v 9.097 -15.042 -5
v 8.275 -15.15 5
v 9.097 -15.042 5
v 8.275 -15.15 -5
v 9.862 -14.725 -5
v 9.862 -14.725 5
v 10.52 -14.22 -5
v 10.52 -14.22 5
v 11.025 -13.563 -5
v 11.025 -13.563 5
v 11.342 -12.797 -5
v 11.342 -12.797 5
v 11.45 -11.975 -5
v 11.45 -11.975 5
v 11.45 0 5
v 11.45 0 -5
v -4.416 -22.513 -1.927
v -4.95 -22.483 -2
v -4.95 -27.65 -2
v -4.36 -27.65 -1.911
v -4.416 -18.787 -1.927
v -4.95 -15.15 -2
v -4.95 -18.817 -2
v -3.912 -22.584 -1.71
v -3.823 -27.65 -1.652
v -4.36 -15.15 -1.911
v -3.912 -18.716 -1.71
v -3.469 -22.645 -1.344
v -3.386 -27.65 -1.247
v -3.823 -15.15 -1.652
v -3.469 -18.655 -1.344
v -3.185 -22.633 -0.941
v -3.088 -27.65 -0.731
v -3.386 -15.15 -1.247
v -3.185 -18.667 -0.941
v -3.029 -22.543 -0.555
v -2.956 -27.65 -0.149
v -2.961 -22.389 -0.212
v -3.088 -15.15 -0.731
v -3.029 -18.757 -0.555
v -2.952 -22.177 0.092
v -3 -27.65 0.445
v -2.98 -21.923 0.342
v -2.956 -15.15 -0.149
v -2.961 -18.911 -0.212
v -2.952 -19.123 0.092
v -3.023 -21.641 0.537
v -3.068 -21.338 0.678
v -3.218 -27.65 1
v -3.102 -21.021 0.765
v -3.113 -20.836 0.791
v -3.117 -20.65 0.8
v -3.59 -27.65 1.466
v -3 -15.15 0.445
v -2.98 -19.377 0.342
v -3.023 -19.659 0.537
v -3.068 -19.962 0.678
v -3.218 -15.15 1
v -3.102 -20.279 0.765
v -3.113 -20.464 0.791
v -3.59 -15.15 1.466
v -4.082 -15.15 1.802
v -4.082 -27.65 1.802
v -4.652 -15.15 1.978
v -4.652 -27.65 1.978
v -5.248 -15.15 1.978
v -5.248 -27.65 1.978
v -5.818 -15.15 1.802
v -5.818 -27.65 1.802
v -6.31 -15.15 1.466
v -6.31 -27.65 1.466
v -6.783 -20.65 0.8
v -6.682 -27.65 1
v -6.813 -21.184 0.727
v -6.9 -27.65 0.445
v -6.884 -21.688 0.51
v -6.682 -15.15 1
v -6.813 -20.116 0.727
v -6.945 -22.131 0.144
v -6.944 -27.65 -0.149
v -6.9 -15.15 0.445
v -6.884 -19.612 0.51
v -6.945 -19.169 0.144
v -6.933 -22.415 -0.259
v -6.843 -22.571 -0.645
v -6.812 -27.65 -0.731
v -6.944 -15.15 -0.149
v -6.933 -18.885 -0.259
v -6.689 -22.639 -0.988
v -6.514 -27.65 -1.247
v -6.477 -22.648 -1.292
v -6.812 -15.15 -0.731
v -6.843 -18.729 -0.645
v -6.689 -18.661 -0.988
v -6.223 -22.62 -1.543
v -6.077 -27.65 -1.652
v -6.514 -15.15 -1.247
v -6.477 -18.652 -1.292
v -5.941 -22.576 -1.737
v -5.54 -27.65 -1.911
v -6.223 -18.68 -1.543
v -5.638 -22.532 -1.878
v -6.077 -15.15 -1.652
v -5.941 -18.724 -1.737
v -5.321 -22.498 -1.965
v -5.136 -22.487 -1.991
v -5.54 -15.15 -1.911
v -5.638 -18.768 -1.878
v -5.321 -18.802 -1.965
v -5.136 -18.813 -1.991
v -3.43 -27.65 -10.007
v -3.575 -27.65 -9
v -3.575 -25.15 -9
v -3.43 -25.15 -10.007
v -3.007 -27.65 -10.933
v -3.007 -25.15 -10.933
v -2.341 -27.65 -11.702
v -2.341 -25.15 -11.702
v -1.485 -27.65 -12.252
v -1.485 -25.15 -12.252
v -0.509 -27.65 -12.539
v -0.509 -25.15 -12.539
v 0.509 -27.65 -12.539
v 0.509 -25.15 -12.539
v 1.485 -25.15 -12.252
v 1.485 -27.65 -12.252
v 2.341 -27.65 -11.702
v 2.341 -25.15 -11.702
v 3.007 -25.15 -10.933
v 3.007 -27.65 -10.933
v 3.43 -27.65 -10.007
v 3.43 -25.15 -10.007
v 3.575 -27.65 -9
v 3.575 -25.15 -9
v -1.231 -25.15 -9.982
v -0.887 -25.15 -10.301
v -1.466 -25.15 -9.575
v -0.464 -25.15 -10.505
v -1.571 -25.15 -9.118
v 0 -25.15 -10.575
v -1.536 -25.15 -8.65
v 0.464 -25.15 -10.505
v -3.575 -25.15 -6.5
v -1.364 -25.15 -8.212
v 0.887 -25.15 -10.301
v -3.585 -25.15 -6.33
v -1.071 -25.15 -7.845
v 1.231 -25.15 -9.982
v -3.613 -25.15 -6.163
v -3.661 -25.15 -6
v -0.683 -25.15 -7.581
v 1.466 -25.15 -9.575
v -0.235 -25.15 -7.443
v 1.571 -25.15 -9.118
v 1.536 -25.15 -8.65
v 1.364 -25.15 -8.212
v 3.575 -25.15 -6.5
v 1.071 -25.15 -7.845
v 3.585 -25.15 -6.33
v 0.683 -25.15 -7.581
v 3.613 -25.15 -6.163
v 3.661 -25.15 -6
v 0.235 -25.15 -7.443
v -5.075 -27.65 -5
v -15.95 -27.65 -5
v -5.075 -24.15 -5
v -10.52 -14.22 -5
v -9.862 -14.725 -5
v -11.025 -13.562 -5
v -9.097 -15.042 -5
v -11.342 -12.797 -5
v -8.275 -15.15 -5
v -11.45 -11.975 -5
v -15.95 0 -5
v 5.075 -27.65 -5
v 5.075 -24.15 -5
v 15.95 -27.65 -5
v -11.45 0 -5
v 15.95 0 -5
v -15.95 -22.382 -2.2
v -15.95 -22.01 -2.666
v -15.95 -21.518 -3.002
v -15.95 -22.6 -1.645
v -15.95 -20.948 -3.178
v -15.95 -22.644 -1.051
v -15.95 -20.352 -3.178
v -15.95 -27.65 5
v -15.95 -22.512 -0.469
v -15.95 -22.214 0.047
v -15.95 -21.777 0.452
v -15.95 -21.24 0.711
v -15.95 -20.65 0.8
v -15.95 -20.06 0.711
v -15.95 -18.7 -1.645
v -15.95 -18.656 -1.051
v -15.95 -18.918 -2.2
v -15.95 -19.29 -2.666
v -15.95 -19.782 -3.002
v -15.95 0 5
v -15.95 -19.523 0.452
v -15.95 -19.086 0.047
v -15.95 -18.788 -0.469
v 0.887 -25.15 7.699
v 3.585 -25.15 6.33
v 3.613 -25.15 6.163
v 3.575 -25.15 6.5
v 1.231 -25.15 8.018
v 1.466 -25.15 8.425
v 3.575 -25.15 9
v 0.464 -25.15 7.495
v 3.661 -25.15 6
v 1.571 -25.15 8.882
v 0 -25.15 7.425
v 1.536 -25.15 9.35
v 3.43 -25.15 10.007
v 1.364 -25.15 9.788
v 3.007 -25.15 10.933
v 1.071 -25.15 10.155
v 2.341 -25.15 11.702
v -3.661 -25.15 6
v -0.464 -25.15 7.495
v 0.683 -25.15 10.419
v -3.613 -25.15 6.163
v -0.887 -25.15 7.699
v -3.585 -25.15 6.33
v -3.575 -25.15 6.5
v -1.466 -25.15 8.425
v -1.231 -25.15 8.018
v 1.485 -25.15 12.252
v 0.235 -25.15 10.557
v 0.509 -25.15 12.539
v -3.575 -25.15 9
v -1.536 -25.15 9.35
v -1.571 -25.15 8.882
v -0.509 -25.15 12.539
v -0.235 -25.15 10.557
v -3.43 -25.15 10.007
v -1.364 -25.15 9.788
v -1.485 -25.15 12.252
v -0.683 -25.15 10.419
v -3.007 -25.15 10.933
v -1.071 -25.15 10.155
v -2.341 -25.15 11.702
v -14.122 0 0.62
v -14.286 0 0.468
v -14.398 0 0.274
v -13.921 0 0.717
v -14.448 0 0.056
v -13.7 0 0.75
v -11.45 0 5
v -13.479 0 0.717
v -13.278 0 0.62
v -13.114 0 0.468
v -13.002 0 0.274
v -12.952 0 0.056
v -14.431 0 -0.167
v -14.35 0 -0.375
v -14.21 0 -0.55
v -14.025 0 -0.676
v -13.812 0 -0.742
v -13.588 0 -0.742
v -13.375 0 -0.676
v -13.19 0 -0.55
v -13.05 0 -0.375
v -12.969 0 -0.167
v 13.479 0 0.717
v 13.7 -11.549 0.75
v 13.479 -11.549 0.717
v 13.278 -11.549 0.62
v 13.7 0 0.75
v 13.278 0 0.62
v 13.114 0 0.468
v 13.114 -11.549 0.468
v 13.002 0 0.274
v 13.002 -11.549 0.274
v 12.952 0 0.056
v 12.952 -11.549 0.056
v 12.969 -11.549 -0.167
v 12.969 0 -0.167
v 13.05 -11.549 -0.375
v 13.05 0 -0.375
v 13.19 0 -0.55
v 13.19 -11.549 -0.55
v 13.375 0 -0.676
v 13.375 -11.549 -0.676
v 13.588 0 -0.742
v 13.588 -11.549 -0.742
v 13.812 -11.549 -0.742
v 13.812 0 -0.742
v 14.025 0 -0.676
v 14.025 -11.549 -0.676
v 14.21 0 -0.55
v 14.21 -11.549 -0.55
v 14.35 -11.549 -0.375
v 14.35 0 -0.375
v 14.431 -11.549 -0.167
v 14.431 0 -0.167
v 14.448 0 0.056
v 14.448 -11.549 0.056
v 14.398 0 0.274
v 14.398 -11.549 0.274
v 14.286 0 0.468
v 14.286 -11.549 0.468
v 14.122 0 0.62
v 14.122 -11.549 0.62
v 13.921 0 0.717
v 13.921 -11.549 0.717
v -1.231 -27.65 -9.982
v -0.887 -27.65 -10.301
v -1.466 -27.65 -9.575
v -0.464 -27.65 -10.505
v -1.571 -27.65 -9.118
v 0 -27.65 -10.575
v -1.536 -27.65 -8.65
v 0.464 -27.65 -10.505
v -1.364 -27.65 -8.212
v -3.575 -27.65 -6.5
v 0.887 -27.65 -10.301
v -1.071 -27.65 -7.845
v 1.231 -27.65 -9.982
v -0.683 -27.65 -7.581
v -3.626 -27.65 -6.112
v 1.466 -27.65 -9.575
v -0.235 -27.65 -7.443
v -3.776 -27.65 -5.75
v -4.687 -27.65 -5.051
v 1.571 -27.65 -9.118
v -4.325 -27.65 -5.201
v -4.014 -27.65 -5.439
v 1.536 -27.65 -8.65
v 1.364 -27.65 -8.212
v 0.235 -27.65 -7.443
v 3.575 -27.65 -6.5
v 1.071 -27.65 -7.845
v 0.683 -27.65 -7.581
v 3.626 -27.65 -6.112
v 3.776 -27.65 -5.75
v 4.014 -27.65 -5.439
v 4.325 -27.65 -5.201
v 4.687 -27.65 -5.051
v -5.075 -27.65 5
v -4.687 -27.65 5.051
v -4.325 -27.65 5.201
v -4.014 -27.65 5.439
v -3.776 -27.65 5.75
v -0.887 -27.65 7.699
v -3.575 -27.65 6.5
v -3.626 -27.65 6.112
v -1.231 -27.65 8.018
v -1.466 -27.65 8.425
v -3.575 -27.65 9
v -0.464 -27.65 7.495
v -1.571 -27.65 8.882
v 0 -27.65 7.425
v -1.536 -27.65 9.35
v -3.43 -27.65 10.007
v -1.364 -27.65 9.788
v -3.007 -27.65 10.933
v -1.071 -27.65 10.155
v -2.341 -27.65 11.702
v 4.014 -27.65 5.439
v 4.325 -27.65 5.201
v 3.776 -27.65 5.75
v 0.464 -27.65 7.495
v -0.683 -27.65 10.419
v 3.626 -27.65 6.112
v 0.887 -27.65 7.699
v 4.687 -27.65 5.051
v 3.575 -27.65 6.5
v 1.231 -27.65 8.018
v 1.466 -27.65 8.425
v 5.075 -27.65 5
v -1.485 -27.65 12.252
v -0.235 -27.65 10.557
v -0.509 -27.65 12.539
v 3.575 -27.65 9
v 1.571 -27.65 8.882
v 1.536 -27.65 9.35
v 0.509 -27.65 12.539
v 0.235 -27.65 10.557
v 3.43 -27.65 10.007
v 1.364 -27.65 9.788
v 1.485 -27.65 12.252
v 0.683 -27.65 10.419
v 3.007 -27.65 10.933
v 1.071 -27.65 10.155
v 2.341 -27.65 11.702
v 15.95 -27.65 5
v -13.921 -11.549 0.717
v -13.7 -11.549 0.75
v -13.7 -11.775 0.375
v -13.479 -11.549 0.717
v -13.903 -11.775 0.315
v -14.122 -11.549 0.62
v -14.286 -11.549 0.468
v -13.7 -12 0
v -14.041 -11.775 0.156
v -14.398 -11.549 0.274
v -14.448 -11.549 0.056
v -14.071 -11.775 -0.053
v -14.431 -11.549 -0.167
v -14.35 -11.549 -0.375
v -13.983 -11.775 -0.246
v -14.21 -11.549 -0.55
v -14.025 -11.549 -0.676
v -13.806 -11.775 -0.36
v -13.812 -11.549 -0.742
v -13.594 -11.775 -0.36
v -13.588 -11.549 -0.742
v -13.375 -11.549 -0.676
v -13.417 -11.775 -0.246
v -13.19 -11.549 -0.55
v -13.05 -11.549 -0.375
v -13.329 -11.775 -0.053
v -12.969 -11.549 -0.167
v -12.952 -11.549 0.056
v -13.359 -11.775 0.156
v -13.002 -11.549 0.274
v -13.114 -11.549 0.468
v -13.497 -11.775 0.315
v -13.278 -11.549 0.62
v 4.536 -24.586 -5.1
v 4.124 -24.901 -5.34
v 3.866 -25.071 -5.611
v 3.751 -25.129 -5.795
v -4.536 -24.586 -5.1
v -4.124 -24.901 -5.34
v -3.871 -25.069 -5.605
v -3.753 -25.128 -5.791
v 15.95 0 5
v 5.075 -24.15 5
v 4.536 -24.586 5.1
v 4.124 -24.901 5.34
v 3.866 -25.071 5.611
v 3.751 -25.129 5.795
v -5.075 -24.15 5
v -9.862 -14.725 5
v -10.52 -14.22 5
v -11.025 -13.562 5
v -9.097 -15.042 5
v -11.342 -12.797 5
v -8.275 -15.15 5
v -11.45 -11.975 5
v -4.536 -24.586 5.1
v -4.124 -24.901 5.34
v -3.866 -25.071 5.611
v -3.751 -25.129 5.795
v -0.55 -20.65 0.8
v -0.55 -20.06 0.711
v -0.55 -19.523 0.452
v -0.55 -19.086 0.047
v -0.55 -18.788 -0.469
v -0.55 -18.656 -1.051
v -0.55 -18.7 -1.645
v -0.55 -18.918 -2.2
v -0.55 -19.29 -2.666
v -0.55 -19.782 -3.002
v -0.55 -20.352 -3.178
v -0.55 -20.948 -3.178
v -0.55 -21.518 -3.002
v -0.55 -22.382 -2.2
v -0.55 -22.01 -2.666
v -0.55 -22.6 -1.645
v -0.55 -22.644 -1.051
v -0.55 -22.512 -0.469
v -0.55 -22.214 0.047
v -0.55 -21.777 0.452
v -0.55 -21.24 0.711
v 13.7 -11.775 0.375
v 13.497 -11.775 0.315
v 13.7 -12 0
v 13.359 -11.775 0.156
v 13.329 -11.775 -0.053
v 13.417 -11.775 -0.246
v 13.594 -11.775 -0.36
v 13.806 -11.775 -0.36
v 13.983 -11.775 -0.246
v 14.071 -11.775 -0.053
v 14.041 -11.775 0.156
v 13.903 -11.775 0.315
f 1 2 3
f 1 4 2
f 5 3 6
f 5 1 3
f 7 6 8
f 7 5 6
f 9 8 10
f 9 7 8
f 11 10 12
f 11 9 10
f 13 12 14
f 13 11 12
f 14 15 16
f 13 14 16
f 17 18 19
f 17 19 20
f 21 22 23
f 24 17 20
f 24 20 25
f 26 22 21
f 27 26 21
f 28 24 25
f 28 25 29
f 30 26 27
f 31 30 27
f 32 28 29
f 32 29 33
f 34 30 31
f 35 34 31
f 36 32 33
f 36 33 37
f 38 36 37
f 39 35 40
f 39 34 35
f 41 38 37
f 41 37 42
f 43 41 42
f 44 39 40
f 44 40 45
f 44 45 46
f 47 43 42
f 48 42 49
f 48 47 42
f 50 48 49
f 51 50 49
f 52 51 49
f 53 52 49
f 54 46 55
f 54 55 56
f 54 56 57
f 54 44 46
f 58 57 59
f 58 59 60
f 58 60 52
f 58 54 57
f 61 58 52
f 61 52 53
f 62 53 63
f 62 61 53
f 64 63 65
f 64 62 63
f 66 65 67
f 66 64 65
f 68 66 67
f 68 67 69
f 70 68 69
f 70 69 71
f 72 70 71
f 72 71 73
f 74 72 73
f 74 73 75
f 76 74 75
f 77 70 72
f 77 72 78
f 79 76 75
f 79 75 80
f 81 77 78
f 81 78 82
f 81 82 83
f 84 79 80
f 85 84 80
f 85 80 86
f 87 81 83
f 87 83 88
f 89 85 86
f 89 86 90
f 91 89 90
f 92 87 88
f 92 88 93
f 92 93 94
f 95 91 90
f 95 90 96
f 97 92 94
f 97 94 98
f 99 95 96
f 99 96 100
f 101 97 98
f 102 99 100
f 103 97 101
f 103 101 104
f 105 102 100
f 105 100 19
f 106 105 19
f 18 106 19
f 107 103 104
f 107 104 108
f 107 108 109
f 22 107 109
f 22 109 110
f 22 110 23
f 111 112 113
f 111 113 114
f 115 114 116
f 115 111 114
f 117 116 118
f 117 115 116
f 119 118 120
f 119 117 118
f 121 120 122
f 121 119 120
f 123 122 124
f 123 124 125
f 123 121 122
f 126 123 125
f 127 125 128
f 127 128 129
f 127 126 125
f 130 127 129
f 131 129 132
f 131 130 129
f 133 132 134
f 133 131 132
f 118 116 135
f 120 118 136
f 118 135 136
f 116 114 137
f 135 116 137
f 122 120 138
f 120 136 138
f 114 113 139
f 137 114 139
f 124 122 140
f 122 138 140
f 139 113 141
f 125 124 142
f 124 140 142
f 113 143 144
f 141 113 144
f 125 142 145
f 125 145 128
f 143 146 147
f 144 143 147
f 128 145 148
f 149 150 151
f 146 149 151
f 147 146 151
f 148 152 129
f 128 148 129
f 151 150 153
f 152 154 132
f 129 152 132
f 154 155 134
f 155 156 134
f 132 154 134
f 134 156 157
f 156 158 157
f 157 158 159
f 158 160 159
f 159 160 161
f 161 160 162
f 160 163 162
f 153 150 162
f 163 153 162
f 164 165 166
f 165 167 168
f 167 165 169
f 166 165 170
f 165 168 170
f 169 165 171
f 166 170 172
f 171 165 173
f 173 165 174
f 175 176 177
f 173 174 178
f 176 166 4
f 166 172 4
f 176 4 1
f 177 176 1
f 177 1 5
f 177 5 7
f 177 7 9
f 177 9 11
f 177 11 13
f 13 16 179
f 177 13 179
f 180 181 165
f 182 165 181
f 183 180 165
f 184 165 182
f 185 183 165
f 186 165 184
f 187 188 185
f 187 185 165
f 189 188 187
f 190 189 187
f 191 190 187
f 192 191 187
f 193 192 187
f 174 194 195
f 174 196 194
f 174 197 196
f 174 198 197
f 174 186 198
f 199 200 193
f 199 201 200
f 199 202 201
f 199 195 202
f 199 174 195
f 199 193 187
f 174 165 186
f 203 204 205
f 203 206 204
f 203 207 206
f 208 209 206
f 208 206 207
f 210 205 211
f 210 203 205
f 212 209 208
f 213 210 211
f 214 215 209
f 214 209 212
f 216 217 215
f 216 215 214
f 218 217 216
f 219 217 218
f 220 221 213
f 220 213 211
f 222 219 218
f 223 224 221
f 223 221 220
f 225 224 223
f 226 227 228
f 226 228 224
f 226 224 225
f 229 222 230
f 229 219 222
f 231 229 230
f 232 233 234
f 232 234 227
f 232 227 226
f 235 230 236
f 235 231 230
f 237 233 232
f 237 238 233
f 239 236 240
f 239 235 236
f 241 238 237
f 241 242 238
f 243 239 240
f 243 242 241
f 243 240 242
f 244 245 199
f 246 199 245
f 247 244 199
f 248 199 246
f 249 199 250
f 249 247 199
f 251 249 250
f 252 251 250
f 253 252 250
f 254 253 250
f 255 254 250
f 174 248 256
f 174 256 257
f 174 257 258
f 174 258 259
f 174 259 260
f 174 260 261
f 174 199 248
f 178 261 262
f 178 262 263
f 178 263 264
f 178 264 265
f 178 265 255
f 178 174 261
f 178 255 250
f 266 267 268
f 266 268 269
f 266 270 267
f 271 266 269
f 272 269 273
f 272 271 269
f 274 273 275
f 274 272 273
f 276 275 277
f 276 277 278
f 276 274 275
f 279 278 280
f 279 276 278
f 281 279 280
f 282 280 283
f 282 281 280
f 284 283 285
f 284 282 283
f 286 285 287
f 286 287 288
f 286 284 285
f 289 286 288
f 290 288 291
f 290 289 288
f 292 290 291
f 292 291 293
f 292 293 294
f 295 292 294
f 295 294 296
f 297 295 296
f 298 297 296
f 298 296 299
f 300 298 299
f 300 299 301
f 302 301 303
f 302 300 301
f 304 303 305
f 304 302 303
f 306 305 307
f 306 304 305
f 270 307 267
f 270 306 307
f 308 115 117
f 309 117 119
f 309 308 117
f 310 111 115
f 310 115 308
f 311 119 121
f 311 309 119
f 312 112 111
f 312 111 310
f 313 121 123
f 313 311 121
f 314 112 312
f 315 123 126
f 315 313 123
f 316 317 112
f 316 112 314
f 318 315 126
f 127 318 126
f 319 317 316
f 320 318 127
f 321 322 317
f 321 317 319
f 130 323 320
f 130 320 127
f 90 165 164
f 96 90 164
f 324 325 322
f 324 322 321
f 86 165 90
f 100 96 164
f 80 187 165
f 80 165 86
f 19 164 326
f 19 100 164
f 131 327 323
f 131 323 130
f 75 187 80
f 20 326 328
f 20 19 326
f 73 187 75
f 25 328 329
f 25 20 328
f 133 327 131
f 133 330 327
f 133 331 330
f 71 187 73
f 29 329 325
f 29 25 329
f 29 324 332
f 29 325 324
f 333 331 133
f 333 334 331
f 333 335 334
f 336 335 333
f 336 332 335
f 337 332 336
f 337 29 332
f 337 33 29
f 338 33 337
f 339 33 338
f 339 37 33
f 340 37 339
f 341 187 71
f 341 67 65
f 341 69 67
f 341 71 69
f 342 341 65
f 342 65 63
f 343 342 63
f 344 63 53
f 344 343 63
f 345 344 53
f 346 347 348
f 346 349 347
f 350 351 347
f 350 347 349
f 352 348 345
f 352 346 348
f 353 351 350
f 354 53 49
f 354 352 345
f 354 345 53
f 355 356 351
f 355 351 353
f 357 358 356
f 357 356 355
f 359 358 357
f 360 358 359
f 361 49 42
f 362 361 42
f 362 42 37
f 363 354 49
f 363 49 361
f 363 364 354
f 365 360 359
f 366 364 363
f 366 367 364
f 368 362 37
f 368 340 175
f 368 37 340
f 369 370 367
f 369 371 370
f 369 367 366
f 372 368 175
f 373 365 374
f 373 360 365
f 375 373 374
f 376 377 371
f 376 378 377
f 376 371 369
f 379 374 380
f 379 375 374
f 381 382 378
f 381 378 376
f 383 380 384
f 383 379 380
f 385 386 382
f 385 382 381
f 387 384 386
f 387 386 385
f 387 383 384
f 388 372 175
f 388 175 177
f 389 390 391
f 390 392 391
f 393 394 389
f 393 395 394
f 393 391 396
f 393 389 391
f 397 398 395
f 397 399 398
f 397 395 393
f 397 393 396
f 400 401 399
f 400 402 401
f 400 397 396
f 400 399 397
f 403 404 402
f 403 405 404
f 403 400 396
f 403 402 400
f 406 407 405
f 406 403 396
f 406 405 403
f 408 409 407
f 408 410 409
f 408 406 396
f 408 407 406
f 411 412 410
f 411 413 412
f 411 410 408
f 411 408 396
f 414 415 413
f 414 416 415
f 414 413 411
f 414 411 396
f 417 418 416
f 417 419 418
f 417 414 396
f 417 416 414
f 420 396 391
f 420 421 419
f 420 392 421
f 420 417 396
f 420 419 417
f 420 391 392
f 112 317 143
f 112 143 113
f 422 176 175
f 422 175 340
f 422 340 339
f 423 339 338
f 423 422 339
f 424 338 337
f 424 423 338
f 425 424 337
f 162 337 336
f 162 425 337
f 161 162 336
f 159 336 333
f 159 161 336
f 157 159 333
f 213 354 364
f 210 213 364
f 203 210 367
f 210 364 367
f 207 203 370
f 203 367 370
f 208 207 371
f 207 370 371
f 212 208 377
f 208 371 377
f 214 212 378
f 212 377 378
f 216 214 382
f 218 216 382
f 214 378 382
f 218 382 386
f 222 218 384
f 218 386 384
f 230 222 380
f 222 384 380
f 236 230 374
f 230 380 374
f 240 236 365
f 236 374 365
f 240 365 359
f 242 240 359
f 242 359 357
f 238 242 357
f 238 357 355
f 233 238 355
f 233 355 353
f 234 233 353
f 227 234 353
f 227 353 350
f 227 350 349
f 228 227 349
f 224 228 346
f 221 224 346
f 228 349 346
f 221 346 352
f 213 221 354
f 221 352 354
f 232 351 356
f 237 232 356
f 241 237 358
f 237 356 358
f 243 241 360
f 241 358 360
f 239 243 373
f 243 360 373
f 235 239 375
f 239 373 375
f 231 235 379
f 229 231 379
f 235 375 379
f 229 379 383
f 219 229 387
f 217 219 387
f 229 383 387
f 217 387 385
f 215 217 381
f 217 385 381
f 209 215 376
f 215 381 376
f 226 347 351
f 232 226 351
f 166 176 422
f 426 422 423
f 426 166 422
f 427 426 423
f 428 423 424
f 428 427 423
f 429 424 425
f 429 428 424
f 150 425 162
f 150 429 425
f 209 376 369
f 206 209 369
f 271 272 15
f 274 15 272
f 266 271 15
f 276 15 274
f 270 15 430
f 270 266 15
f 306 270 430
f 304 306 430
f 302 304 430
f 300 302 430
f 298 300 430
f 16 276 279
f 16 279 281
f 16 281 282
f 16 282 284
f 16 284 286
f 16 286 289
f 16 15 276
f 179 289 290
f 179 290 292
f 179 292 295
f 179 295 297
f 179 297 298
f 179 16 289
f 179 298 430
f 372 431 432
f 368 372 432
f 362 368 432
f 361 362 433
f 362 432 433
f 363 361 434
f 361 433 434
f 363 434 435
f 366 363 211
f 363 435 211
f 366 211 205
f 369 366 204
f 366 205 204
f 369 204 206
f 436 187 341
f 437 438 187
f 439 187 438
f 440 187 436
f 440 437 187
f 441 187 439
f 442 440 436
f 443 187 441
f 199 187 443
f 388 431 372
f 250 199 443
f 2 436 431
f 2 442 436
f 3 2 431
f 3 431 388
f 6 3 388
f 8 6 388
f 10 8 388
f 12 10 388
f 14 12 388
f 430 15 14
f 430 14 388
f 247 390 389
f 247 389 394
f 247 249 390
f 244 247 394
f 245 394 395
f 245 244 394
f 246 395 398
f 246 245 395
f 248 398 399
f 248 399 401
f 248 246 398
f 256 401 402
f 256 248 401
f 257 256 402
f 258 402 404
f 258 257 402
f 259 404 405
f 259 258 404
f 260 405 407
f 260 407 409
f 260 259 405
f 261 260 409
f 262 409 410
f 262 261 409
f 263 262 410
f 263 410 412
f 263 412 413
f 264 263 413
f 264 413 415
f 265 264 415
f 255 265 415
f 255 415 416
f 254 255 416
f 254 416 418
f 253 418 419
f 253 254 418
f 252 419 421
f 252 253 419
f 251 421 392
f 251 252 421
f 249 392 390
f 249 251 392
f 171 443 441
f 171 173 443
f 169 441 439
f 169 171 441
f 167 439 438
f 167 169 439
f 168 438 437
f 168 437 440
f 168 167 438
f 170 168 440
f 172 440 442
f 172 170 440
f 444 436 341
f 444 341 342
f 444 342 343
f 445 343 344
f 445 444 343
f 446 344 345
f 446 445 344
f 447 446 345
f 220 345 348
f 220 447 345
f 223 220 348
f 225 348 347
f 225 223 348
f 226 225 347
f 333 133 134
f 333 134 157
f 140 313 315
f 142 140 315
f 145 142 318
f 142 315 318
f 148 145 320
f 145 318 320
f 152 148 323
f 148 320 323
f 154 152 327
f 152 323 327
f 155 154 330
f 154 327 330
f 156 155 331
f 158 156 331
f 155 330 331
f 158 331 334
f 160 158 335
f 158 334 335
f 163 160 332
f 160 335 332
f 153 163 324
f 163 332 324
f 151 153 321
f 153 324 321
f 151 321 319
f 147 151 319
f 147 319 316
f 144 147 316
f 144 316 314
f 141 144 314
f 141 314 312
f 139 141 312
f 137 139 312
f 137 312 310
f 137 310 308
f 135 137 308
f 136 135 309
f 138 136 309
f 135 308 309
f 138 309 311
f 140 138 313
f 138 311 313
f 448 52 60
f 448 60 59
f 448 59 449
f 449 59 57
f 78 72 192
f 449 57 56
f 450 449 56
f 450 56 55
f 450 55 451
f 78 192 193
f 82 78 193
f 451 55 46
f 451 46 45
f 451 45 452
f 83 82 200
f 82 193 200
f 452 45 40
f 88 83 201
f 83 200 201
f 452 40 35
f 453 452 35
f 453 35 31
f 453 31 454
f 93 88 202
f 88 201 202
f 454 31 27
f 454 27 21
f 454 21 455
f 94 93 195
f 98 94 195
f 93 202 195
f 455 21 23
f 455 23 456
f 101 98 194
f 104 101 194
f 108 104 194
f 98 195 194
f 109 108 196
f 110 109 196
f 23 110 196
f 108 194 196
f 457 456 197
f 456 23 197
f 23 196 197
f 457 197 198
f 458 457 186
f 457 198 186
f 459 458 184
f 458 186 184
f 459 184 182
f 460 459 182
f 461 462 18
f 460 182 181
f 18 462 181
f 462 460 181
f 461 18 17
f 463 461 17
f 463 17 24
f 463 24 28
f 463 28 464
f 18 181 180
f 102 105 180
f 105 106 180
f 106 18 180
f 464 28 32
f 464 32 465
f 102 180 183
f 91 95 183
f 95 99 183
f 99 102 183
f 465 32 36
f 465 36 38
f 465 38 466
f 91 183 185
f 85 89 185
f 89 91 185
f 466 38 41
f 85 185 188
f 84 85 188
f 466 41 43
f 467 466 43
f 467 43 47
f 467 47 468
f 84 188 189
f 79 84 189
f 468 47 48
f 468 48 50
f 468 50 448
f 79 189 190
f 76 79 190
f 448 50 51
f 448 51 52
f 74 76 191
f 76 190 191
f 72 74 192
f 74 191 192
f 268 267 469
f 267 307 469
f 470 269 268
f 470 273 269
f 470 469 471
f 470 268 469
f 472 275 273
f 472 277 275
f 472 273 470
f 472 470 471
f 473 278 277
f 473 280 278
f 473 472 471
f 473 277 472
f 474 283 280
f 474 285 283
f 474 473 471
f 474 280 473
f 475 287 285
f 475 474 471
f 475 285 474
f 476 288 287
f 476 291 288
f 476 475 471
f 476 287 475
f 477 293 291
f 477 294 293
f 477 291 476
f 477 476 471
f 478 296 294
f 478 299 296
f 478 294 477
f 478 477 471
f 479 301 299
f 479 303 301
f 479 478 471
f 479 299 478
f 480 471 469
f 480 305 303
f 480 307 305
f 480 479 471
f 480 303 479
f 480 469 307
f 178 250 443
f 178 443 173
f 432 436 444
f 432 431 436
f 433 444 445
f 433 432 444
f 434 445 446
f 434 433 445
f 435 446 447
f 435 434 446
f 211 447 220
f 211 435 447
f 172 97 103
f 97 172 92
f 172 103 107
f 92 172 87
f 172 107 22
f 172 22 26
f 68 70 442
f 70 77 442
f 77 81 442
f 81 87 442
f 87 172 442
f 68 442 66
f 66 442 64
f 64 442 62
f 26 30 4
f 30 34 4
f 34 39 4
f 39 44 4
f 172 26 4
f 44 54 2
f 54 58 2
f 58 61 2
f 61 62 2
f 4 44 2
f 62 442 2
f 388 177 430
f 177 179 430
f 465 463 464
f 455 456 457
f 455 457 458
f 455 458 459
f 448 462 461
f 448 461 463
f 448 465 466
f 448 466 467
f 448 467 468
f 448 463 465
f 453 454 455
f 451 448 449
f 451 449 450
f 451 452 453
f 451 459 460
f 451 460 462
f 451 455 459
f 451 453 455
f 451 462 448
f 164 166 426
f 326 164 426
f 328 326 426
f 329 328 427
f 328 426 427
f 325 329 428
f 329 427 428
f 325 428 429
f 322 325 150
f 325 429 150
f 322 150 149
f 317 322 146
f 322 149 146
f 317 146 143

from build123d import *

# Parameters (mm, degrees)
SKETCH1_W                      = 4.5
SKETCH1_H                      = 10
BOSS_EXTRUDE1_DEPTH            = 15.15
BOSS_EXTRUDE1_2_DEPTH          = 15.15
F_1_5MM_DOWEL_HOLE1_AT_2_COUNT = 2
F_1_5MM_DOWEL_HOLE1_AT_2_PITCH = 27.4
SKETCH5_W                      = 31.9
SKETCH5_H                      = 10
SKETCH5_R                      = 2
BOSS_EXTRUDE2_DEPTH            = 12.5
FILLET1_R                      = 3.175
SKETCH6_R                      = 2
CUT_EXTRUDE1_DEPTH             = 15.4
SKETCH7_R                      = 1.575
BOSS_EXTRUDE3_DEPTH            = 2.5
FILLET3_R                      = 1.5
FILLET4_R                      = 1


with BuildPart() as part:
    # Sketch1 → Boss-Extrude1 (new body)
    with BuildSketch(Plane(origin=(0, 0, 0), x_dir=(1, 0, 0), z_dir=(0, 1, 0))):
        with Locations((-13.7, 0)):
            Rectangle(SKETCH1_W, SKETCH1_H)
    extrude(amount=-BOSS_EXTRUDE1_DEPTH)

    # Sketch4 → Ø1.5mm Dowel Hole1 (revolve, cut)
    with BuildSketch(Plane(origin=(-13.7, 0, 0), x_dir=(0, 0, 1), z_dir=(1, 0, 0))):
        Polygon((0, 0), (0, 12), (0.75, 11.549354536), (0.75, 0), align=None)
    f_1_5mm_dowel_hole1 = revolve(axis=Axis((-13.7, 6.35, 0), (0, -1, 0)), mode=Mode.SUBTRACT)



with BuildPart() as body_2:
    # Sketch1 → Boss-Extrude1 2 (new body)
    with BuildSketch(Plane(origin=(0, 0, 0), x_dir=(1, 0, 0), z_dir=(0, 1, 0))):
        with Locations((13.7, 0)):
            Rectangle(SKETCH1_W, SKETCH1_H)
    extrude(amount=-BOSS_EXTRUDE1_2_DEPTH)

    # Ø1.5mm Dowel Hole1 at 2: Ø1.5mm Dowel Hole1 ×2
    with Locations(*[(i * F_1_5MM_DOWEL_HOLE1_AT_2_PITCH, 0, 0) for i in range(1, F_1_5MM_DOWEL_HOLE1_AT_2_COUNT)]):
        add(f_1_5mm_dowel_hole1, mode=Mode.SUBTRACT)


with BuildPart() as part_1:
    add(part.part)

    add(body_2.part)  # Boss-Extrude2 merges body 2
    # Sketch5 → Boss-Extrude2 (add)
    with BuildSketch(Plane.XZ.offset(15.15)):
        Rectangle(SKETCH5_W, SKETCH5_H)
        with Locations(Location((-4.95, 0, 0), (0, 0, 270))):
            Circle(SKETCH5_R, mode=Mode.SUBTRACT)
    extrude(amount=BOSS_EXTRUDE2_DEPTH)

    # Fillet1
    fillet1_edges = [part_1.edges().sort_by_distance(p)[0] for p in [
        (-11.45, -15.15, 0),
        (11.45, -15.15, 0),
    ]]
    fillet(fillet1_edges, radius=FILLET1_R)

    # Sketch6 → Cut-Extrude1 (cut)
    with BuildSketch(Plane.ZY.offset(15.95)):
        with Locations((-1.2, -20.65)):
            Circle(SKETCH6_R)
    extrude(amount=-CUT_EXTRUDE1_DEPTH, mode=Mode.SUBTRACT)

    # Sketch7 → Boss-Extrude3 (add)
    # profile 1 of 2: a face of its own
    with BuildSketch(Plane.XZ.offset(27.65)):
        with BuildLine():
            Line((3.575, 9), (3.575, 5))
            Line((3.575, 5), (-3.575, 5))
            Line((-3.575, 5), (-3.575, 9))
            ThreePointArc((-3.575, 9), (0, 12.575), (3.575, 9))
        make_face()
        with Locations(Location((0, 9, 0), (0, 0, 270))):
            Circle(SKETCH7_R, mode=Mode.SUBTRACT)
    # profile 2 of 2: a face of its own
    with BuildSketch(Plane.XZ.offset(27.65)):
        with BuildLine():
            Line((3.575, -5), (-3.575, -5))
            Line((-3.575, -5), (-3.575, -9))
            ThreePointArc((-3.575, -9), (0, -12.575), (3.575, -9))
            Line((3.575, -9), (3.575, -5))
        make_face()
        with Locations(Location((0, -9, 0), (0, 0, 270))):
            Circle(SKETCH7_R, mode=Mode.SUBTRACT)
    extrude(amount=-BOSS_EXTRUDE3_DEPTH)

    # Fillet3
    fillet3_edges = [part_1.edges().sort_by_distance(p)[0] for p in [
        (3.575, -26.4, 5),
        (-3.575, -26.4, 5),
        (-3.575, -26.4, -5),
        (3.575, -26.4, -5),
    ]]
    fillet(fillet3_edges, radius=FILLET3_R)

    # Fillet4
    fillet4_edges = [part_1.edges().sort_by_distance(p)[0] for p in [
        (0, -25.15, 5),
        (0, -25.15, -5),
    ]]
    fillet(fillet4_edges, radius=FILLET4_R)


solid = part_1.part
